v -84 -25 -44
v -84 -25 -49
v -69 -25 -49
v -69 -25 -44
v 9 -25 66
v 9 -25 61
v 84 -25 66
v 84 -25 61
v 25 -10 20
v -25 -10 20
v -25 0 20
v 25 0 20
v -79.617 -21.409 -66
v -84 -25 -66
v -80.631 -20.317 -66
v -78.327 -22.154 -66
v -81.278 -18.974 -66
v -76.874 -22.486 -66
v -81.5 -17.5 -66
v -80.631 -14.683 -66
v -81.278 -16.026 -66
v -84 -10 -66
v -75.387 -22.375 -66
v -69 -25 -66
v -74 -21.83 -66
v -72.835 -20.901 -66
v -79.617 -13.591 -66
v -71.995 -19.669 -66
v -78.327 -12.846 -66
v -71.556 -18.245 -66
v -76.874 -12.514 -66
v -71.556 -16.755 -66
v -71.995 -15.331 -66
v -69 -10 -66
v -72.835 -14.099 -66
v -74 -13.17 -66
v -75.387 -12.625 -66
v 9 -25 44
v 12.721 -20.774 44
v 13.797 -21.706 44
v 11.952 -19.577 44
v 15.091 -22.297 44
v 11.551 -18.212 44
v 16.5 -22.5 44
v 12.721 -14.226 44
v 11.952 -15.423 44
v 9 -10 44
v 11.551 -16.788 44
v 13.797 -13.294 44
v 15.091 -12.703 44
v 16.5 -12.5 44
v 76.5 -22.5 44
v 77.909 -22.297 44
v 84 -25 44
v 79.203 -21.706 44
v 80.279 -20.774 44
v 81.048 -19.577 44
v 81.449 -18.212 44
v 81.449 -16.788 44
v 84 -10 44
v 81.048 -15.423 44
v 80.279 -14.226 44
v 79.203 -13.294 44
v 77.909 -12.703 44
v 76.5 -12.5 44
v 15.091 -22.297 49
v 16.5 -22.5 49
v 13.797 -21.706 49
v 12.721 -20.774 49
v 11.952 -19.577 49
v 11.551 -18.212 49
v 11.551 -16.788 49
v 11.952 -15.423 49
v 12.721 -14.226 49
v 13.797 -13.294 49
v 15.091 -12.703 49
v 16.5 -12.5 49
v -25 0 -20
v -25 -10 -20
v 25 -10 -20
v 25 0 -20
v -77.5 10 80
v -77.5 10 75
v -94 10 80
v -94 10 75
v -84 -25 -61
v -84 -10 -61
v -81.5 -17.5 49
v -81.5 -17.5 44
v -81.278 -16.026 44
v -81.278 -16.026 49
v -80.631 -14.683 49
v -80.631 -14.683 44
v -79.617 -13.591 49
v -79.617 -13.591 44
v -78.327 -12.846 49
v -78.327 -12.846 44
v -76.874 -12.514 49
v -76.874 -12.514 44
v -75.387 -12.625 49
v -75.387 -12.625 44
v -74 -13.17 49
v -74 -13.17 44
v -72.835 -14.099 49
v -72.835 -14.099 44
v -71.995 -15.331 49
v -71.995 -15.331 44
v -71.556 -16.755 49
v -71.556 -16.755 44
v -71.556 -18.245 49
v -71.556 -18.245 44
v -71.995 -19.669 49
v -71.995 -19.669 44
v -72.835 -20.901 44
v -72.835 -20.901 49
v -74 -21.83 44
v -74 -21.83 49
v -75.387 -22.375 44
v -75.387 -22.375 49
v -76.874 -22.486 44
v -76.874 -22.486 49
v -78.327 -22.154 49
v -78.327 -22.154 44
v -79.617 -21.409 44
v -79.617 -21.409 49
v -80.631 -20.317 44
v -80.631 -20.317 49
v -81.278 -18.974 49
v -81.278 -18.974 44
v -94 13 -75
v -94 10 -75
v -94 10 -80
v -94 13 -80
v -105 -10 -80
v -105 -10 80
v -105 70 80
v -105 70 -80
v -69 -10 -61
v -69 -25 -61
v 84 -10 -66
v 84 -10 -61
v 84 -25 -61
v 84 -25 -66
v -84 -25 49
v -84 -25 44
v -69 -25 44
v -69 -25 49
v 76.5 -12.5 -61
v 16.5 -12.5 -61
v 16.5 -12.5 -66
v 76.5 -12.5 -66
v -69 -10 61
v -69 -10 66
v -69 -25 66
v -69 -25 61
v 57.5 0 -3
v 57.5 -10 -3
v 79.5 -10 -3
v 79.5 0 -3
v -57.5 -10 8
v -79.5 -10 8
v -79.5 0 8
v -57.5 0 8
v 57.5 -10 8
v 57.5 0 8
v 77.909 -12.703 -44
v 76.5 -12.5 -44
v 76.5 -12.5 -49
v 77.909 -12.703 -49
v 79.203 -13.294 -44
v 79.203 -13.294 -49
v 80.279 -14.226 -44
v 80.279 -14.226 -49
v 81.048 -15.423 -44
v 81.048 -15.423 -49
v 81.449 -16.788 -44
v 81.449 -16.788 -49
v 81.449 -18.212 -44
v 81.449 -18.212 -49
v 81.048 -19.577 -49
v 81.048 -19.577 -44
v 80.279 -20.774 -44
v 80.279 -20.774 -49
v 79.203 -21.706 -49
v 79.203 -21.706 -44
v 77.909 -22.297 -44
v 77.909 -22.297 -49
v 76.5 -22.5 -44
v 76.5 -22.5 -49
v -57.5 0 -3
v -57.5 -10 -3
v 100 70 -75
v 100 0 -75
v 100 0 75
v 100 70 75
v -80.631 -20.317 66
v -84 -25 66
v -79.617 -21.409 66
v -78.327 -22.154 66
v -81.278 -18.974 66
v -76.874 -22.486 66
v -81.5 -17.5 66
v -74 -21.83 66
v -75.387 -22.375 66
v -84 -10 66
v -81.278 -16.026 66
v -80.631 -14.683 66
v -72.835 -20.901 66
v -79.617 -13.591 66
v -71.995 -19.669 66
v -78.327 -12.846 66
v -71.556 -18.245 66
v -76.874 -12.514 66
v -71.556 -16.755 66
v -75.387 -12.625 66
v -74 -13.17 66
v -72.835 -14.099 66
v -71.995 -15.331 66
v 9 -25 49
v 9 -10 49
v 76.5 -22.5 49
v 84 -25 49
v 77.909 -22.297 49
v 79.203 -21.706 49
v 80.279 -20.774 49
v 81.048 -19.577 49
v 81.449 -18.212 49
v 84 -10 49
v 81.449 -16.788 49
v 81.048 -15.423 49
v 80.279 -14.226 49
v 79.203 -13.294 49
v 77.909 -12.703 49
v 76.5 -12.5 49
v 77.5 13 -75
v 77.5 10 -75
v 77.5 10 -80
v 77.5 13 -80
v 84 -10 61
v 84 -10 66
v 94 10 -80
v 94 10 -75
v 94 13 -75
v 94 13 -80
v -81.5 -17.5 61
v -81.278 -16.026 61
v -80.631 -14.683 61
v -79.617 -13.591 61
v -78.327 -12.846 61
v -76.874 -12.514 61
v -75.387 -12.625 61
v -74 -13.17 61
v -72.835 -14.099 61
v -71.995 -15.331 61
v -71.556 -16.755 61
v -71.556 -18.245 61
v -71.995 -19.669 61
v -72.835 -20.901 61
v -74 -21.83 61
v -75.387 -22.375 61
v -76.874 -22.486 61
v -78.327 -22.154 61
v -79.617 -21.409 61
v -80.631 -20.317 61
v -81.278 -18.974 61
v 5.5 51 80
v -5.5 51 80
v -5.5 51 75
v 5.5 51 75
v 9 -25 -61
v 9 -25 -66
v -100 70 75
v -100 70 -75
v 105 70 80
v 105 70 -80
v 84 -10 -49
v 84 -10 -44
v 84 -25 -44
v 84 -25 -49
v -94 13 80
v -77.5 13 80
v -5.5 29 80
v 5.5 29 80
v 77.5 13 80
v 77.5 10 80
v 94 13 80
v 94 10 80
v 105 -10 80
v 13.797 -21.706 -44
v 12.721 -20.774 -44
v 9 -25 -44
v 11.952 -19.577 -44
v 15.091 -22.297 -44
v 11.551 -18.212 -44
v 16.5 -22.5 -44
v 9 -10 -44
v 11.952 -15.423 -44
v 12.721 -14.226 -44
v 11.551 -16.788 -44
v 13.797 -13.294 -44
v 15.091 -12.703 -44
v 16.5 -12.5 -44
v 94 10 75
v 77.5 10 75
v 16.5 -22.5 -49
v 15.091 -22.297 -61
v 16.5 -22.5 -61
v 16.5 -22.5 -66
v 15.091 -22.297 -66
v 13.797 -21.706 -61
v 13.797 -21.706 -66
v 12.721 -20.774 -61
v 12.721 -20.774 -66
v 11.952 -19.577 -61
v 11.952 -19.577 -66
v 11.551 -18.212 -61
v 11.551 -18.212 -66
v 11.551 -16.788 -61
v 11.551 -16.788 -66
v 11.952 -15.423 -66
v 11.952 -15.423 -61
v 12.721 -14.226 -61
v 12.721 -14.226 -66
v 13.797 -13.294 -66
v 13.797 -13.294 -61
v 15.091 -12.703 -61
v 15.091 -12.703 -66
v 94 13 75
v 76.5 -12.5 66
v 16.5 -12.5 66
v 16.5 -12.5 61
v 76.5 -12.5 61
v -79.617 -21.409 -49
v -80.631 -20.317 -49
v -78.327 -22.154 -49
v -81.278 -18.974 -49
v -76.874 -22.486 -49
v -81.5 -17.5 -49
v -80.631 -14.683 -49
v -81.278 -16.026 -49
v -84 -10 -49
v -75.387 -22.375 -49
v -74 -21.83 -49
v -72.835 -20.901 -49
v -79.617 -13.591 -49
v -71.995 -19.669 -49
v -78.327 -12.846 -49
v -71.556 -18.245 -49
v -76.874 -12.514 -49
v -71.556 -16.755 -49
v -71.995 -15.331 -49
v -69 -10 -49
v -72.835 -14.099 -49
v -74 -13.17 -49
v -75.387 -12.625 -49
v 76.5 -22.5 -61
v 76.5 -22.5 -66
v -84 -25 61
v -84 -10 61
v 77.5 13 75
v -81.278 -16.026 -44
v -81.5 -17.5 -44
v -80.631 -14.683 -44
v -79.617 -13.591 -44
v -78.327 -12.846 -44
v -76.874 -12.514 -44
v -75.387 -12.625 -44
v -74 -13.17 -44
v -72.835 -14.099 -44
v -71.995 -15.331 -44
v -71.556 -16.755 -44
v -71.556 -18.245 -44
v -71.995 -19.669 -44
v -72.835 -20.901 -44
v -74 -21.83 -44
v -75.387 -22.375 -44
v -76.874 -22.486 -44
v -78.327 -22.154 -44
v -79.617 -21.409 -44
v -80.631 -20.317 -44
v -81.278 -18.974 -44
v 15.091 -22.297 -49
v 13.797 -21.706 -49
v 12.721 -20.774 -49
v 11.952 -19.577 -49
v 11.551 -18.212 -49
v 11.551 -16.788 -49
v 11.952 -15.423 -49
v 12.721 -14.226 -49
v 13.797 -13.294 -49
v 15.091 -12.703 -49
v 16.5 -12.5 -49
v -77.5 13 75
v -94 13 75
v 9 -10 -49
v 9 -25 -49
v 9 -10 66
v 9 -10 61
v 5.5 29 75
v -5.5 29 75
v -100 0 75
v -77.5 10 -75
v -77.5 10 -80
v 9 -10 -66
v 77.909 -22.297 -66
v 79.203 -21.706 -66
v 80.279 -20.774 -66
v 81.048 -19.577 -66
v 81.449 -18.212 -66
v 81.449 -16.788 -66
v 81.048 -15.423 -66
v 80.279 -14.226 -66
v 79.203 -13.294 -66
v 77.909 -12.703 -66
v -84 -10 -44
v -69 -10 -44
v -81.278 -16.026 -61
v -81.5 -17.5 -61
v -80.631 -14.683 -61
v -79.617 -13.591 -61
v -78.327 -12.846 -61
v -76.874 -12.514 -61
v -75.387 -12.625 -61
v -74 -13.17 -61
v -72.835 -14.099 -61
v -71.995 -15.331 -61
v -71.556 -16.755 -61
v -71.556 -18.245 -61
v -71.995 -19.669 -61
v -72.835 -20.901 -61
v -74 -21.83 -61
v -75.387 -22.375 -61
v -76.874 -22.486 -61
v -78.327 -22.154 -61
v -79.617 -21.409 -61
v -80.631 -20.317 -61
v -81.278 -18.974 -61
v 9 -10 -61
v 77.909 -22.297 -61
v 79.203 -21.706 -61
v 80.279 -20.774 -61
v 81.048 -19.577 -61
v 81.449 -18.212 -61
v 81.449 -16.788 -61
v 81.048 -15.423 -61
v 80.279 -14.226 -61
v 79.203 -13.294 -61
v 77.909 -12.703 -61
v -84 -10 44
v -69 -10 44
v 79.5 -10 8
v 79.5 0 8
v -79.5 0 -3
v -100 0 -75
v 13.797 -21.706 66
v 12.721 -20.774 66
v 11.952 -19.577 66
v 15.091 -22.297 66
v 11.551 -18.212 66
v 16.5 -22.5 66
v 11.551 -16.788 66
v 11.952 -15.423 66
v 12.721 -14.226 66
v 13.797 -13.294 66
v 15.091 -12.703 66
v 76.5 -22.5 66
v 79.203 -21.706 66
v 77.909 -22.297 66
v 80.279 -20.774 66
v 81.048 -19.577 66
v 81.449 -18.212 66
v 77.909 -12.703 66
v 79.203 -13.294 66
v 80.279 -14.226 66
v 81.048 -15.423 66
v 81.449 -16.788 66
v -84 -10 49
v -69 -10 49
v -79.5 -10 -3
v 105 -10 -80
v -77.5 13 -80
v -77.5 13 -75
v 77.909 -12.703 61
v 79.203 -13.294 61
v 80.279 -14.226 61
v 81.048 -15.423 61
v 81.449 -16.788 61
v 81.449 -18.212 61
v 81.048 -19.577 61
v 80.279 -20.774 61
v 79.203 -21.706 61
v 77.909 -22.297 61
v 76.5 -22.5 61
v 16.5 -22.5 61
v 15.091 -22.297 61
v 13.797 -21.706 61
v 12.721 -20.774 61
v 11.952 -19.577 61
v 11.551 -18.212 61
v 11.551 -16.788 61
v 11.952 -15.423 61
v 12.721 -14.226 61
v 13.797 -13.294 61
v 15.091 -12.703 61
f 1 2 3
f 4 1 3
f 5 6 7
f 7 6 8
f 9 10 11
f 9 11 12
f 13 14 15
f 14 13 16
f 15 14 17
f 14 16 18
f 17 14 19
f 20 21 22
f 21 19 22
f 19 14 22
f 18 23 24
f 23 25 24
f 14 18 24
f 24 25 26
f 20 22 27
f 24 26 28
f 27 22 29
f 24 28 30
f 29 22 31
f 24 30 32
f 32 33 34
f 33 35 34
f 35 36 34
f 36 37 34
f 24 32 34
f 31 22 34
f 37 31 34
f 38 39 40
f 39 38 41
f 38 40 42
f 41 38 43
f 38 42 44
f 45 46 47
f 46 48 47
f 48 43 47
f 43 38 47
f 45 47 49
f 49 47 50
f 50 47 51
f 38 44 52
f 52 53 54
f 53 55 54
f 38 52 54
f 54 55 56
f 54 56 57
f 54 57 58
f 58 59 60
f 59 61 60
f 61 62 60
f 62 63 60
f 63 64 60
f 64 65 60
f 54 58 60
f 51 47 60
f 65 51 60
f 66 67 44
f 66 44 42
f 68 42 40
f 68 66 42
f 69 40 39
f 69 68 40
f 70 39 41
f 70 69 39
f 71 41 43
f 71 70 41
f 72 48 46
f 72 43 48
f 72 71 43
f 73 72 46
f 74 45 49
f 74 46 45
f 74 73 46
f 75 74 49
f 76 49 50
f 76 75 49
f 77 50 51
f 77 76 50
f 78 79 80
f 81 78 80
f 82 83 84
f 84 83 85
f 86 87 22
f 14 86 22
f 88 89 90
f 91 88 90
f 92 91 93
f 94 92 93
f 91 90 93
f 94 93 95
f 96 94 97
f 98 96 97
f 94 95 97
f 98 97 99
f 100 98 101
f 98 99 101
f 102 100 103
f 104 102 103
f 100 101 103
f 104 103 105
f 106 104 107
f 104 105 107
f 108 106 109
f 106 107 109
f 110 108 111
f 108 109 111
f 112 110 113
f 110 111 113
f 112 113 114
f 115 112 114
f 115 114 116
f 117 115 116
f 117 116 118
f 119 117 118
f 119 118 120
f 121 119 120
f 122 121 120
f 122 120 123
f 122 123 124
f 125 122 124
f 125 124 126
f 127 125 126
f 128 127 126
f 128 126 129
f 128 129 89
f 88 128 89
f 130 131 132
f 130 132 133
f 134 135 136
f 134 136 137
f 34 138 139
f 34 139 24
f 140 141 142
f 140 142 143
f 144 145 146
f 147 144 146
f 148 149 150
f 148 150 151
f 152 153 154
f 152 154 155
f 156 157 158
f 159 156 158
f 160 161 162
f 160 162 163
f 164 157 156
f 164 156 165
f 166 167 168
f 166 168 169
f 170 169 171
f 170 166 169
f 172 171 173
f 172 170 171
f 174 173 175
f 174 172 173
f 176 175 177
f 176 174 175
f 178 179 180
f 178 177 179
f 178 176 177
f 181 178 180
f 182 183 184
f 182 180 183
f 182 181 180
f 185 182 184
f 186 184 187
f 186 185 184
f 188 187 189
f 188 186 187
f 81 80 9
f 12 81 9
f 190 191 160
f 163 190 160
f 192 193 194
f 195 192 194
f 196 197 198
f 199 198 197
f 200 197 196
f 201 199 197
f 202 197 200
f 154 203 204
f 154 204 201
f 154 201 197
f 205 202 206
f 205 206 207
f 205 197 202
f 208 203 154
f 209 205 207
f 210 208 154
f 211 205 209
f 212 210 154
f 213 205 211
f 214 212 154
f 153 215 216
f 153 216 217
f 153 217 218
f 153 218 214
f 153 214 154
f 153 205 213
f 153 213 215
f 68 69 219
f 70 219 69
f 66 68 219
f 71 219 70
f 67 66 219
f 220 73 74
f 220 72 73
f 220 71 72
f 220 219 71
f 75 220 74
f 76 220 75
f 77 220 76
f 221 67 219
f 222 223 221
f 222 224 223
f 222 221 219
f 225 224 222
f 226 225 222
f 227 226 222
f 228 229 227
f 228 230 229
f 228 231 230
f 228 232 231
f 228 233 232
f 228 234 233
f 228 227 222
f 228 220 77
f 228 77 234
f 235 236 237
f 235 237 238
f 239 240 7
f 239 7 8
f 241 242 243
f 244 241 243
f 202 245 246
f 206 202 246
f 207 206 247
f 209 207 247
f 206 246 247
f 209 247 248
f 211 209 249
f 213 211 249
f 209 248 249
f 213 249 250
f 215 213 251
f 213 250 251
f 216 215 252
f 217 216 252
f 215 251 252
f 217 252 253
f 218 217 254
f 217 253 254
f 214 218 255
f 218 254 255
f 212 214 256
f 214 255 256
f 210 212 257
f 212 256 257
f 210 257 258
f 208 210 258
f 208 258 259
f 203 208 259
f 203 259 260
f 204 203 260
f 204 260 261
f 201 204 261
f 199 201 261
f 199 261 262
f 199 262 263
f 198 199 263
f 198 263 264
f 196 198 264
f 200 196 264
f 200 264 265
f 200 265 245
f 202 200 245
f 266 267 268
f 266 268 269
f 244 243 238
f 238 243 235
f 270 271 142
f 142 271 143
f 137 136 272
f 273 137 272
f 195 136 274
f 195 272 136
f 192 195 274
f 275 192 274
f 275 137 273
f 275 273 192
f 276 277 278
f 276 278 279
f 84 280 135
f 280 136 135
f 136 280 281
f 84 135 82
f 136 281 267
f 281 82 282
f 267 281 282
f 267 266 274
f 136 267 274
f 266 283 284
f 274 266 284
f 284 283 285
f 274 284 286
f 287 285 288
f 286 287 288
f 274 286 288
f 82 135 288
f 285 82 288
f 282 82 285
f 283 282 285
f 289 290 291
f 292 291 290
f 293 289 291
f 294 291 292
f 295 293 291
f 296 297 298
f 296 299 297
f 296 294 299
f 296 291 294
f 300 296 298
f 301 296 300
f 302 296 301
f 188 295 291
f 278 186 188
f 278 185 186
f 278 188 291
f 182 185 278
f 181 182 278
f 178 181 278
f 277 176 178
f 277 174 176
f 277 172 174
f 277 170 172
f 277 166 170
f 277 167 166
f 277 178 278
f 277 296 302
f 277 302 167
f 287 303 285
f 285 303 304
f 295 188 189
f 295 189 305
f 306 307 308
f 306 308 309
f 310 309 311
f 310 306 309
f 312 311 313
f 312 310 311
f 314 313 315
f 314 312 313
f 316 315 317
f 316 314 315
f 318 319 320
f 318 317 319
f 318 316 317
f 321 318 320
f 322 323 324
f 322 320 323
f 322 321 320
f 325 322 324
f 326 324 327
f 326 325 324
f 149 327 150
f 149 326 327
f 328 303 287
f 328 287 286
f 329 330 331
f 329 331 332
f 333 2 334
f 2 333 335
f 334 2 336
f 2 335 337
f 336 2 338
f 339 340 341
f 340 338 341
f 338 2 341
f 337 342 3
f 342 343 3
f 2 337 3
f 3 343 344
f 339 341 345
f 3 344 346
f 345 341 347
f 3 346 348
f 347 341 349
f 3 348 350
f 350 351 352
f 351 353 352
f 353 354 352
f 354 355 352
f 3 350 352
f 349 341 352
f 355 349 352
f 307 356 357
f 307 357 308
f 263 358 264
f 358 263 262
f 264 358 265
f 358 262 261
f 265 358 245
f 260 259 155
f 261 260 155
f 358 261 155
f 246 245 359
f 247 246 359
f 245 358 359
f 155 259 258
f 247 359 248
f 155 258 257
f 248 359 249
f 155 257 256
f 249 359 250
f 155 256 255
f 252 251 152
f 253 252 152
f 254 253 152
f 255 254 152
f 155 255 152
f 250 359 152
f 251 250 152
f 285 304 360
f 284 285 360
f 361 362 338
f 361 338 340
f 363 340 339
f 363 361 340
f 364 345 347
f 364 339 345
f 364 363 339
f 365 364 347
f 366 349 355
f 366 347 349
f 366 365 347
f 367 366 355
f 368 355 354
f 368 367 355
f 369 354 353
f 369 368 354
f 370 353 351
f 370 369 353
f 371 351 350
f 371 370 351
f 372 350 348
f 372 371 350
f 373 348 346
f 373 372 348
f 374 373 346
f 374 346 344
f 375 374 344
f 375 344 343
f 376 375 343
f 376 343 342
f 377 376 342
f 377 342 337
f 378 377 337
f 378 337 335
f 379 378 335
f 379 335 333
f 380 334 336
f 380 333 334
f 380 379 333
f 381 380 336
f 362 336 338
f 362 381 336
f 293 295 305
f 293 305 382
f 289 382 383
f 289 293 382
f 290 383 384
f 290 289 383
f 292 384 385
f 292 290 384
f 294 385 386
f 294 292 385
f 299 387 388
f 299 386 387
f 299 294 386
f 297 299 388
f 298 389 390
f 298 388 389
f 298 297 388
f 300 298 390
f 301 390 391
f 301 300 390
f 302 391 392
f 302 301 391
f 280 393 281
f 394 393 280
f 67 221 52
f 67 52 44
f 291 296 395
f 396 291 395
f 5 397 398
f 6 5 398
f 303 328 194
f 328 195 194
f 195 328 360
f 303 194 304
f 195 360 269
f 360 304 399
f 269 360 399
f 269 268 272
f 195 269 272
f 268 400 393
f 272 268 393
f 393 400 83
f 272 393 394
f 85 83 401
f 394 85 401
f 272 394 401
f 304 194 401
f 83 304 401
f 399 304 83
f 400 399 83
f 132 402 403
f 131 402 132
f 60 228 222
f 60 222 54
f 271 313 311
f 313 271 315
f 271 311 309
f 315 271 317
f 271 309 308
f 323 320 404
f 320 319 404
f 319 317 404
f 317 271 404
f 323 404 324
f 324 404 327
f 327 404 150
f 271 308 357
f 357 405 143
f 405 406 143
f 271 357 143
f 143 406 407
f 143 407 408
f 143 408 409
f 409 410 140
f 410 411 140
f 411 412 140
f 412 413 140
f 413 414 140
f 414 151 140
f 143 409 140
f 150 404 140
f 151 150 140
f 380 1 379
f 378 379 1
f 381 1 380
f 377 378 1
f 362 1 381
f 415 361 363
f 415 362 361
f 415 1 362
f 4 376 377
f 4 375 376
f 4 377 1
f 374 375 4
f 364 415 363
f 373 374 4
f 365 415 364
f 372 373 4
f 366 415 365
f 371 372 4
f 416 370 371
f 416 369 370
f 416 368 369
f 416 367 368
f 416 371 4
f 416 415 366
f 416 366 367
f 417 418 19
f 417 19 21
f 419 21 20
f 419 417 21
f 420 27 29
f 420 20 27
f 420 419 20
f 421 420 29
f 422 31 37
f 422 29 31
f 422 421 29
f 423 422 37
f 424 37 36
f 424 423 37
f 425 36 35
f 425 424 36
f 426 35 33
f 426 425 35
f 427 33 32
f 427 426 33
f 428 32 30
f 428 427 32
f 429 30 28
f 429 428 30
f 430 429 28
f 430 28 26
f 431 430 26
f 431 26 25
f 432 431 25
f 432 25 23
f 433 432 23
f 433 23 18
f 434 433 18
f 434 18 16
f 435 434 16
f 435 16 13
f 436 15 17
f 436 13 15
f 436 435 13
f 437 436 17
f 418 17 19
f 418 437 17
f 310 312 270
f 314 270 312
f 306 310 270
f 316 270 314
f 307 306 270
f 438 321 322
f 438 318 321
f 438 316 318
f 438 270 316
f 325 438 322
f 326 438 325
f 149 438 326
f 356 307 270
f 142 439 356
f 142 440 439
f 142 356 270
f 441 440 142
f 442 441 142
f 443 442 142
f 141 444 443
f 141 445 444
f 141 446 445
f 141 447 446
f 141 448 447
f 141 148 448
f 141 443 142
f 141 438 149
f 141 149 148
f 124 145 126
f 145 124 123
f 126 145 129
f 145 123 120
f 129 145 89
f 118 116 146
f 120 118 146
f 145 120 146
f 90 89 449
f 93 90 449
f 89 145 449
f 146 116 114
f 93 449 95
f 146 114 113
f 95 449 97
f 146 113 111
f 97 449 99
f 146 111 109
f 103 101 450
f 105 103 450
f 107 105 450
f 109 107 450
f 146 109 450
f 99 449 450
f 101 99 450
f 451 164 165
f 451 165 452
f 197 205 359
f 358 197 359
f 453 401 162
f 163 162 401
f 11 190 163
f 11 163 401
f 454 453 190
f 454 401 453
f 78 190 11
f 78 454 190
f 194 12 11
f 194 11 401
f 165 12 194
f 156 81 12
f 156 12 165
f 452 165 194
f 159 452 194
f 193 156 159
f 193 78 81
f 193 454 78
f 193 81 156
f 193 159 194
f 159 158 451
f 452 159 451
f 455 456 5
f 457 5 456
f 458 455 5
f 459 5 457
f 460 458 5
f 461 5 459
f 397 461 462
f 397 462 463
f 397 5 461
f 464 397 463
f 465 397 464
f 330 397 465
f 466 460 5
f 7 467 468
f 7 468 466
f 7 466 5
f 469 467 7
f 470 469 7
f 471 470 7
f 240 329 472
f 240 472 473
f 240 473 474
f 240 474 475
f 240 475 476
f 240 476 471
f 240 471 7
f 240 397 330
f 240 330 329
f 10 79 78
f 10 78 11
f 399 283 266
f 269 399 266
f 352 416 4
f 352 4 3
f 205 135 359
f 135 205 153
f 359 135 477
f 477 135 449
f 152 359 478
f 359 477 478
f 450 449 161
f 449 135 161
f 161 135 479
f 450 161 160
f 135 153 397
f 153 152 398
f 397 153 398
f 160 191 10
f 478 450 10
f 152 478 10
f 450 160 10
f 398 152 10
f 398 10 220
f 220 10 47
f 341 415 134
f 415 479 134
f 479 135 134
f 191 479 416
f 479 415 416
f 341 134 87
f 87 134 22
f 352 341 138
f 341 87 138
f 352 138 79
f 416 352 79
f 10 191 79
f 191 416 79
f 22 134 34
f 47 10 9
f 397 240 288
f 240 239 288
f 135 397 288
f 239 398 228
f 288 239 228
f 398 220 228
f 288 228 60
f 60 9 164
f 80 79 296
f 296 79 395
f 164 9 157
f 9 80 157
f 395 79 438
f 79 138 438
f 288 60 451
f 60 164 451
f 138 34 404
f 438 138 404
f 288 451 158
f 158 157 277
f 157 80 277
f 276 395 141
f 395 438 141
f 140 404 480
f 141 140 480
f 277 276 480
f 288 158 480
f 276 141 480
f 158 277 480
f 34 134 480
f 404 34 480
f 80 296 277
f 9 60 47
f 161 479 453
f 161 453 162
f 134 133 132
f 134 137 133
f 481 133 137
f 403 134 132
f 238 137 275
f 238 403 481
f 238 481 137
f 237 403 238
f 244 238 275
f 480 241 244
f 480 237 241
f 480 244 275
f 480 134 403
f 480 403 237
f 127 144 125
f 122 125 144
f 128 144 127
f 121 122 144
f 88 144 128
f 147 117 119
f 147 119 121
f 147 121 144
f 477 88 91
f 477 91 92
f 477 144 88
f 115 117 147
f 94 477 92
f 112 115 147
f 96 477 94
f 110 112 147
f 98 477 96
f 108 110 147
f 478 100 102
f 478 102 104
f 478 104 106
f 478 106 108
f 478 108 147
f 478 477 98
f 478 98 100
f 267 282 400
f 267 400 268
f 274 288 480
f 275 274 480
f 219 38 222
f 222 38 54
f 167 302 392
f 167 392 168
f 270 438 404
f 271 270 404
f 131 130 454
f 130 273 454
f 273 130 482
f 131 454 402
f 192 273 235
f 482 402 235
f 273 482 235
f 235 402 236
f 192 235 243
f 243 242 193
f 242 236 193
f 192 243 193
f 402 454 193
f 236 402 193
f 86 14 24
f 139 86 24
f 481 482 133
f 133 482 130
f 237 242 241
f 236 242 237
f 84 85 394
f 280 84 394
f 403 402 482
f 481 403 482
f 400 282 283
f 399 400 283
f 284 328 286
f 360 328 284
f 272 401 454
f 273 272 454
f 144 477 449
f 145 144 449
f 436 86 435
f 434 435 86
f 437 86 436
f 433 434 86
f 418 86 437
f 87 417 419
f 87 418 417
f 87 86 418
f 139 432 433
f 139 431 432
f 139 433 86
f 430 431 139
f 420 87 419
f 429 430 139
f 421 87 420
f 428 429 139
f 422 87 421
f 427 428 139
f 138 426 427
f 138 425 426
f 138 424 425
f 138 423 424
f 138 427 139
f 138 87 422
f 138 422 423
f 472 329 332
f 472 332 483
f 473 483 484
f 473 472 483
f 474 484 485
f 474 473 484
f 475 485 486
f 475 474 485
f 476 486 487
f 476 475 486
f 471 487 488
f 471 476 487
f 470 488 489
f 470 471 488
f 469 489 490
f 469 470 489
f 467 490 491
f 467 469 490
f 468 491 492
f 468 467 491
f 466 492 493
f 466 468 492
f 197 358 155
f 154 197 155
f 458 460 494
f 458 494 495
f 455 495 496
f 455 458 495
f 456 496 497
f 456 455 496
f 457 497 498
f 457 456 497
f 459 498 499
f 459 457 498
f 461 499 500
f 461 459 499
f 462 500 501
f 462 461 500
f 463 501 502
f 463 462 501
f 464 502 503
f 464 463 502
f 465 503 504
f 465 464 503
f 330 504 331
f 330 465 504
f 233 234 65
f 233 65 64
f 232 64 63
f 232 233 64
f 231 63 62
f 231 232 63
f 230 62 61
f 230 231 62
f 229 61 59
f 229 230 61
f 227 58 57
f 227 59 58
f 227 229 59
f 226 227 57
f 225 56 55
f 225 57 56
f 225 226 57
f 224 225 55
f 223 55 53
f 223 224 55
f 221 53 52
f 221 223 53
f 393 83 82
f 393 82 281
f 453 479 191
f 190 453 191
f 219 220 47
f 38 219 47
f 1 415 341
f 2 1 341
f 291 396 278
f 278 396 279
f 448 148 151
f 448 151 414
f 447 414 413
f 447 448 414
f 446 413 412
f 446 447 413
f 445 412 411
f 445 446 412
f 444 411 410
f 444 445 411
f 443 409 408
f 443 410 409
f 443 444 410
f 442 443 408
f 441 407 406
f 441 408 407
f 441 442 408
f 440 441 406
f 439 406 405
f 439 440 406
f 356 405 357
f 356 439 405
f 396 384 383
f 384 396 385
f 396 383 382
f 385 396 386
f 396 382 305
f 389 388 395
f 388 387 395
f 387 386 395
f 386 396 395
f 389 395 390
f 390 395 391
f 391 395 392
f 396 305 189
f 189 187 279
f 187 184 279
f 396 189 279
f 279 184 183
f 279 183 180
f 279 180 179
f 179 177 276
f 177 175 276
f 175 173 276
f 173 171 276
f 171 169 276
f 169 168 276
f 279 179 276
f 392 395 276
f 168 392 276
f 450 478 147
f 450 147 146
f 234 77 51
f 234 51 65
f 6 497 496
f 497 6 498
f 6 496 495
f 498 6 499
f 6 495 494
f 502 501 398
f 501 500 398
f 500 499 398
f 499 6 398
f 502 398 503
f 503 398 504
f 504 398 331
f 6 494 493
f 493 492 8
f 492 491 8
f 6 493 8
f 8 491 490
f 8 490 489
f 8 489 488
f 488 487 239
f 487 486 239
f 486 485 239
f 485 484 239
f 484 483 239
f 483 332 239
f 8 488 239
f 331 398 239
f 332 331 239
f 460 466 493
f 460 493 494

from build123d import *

# Parameters (mm, degrees)
SKETCH1_W                = 200
SKETCH1_H                = 150
SKETCH1_W_2              = 75
SKETCH1_H_2              = 5
SKETCH1_W_3              = 15
BOSS_EXTRUDE2_DEPTH      = 10
SKETCH1_8_W              = 75
SKETCH1_8_H              = 5
SKETCH1_8_W_2            = 15
BOSS_EXTRUDE3_DEPTH      = 25
BOSS_EXTRUDE4_START      = -10
BOSS_EXTRUDE4_DEPTH      = 80
SKETCH7_R                = 5
CUT_EXTRUDE2_DEPTH       = 120
CUT_EXTRUDE2_DEPTH_BACK  = 37
CUT_EXTRUDE3_DEPTH       = 142
SKETCH9_W                = 11
SKETCH9_H                = 22
CUT_EXTRUDE4_DEPTH       = 10
SKETCH15_W               = 22
SKETCH15_H               = 11
SKETCH15_W_2             = 50
SKETCH15_H_2             = 40
CUT_EXTRUDE9_DEPTH       = 10
BOSS_EXTRUDE9_START      = -10
SKETCH18_W               = 210
SKETCH18_H               = 5
BOSS_EXTRUDE9_DEPTH      = 80
SKETCH17_W               = 16.5
SKETCH17_H               = 3
CUT_EXTRUDE11_DEPTH      = 156
CUT_EXTRUDE11_DEPTH_BACK = 6


with BuildPart() as part:
    # Sketch1 → Boss-Extrude2 (new body)
    with BuildSketch(Plane(origin=(0, 0, 0), x_dir=(1, 0, 0), z_dir=(0, 1, 0))):
        Rectangle(SKETCH1_W, SKETCH1_H)
        with Locations((46.5, -63.5)):
            Rectangle(SKETCH1_W_2, SKETCH1_H_2, mode=Mode.SUBTRACT)
        with Locations((-76.5, -63.5)):
            Rectangle(SKETCH1_W_3, SKETCH1_H_2, mode=Mode.SUBTRACT)
        with Locations((-76.5, -46.5)):
            Rectangle(SKETCH1_W_3, SKETCH1_H_2, mode=Mode.SUBTRACT)
        with Locations((46.5, -46.5)):
            Rectangle(SKETCH1_W_2, SKETCH1_H_2, mode=Mode.SUBTRACT)
        with Locations((46.5, 46.5)):
            Rectangle(SKETCH1_W_2, SKETCH1_H_2, mode=Mode.SUBTRACT)
        with Locations((46.5, 63.5)):
            Rectangle(SKETCH1_W_2, SKETCH1_H_2, mode=Mode.SUBTRACT)
        with Locations((-76.5, 63.5)):
            Rectangle(SKETCH1_W_3, SKETCH1_H_2, mode=Mode.SUBTRACT)
        with Locations((-76.5, 46.5)):
            Rectangle(SKETCH1_W_3, SKETCH1_H_2, mode=Mode.SUBTRACT)
    extrude(amount=-BOSS_EXTRUDE2_DEPTH)

    # Sketch1<8> → Boss-Extrude3 (add)
    with BuildSketch(Plane(origin=(0, 0, 0), x_dir=(1, 0, 0), z_dir=(0, 1, 0))):
        with Locations((46.5, -63.5)):
            Rectangle(SKETCH1_8_W, SKETCH1_8_H)
        with Locations((-76.5, -63.5)):
            Rectangle(SKETCH1_8_W_2, SKETCH1_8_H)
        with Locations((-76.5, -46.5)):
            Rectangle(SKETCH1_8_W_2, SKETCH1_8_H)
        with Locations((46.5, -46.5)):
            Rectangle(SKETCH1_8_W, SKETCH1_8_H)
        with Locations((46.5, 46.5)):
            Rectangle(SKETCH1_8_W, SKETCH1_8_H)
        with Locations((46.5, 63.5)):
            Rectangle(SKETCH1_8_W, SKETCH1_8_H)
        with Locations((-76.5, 63.5)):
            Rectangle(SKETCH1_8_W_2, SKETCH1_8_H)
        with Locations((-76.5, 46.5)):
            Rectangle(SKETCH1_8_W_2, SKETCH1_8_H)
    extrude(amount=-BOSS_EXTRUDE3_DEPTH)

    # Sketch5 → Boss-Extrude4 (add)
    with BuildSketch(Plane(origin=(0, 0, 0), x_dir=(-1, 0, 0), z_dir=(0, 1, 0)).offset(BOSS_EXTRUDE4_START)):
        Polygon((100, 75), (100, -75), (105, -75), (105, 70.097096622), (105, 80), (-105, 80), (-105, 70.097096622), (-105, -75), (-100, -75), (-100, 75), align=None)
    extrude(amount=BOSS_EXTRUDE4_DEPTH)

    # Sketch7 → Cut-Extrude2 (cut, two sides)
    with BuildSketch(Plane(origin=(0, 0, 44), x_dir=(-1, 0, 0), z_dir=(0, 0, -1))) as cut_extrude2_sk:
        with Locations((76.5, -17.5)):
            Circle(SKETCH7_R)
    extrude(amount=CUT_EXTRUDE2_DEPTH, mode=Mode.SUBTRACT)
    extrude(cut_extrude2_sk.sketch, amount=-CUT_EXTRUDE2_DEPTH_BACK, mode=Mode.SUBTRACT)

    # Sketch8 → Cut-Extrude3 (cut, through all)
    with BuildSketch(Plane.XY.offset(66)):
        with BuildLine():
            Line((16.5, -12.5), (76.5, -12.5))
            ThreePointArc((76.5, -12.5), (81.5, -17.5), (76.5, -22.5))
            Line((76.5, -22.5), (16.5, -22.5))
            ThreePointArc((16.5, -22.5), (11.5, -17.5), (16.5, -12.5))
        make_face()
    extrude(amount=-CUT_EXTRUDE3_DEPTH, mode=Mode.SUBTRACT)

    # Sketch9 → Cut-Extrude4 (cut)
    with BuildSketch(Plane.XY.offset(80)):
        with Locations((0, 40)):
            Rectangle(SKETCH9_W, SKETCH9_H)
    extrude(amount=-CUT_EXTRUDE4_DEPTH, mode=Mode.SUBTRACT)

    # Sketch15 → Cut-Extrude9 (cut)
    with BuildSketch(Plane.XZ.offset(10)):
        with Locations((-68.5, 2.5)):
            Rectangle(SKETCH15_W, SKETCH15_H)
        with Locations((68.5, 2.5)):
            Rectangle(SKETCH15_W, SKETCH15_H)
        Rectangle(SKETCH15_W_2, SKETCH15_H_2)
    extrude(amount=-CUT_EXTRUDE9_DEPTH, mode=Mode.SUBTRACT)

    # Sketch18 → Boss-Extrude9 (add)
    with BuildSketch(Plane(origin=(0, 0, 0), x_dir=(1, 0, 0), z_dir=(0, 1, 0)).offset(BOSS_EXTRUDE9_START)):
        with Locations((0, 77.5)):
            Rectangle(SKETCH18_W, SKETCH18_H)
    extrude(amount=BOSS_EXTRUDE9_DEPTH)

    # Sketch17 → Cut-Extrude11 (cut, two sides)
    with BuildSketch(Plane(origin=(0, 0, 75), x_dir=(-1, 0, 0), z_dir=(0, 0, -1))) as cut_extrude11_sk:
        with Locations((-85.75, 11.5)):
            Rectangle(SKETCH17_W, SKETCH17_H)
        with Locations((85.75, 11.5)):
            Rectangle(SKETCH17_W, SKETCH17_H)
    extrude(amount=CUT_EXTRUDE11_DEPTH, mode=Mode.SUBTRACT)
    extrude(cut_extrude11_sk.sketch, amount=-CUT_EXTRUDE11_DEPTH_BACK, mode=Mode.SUBTRACT)


solid = part.part
